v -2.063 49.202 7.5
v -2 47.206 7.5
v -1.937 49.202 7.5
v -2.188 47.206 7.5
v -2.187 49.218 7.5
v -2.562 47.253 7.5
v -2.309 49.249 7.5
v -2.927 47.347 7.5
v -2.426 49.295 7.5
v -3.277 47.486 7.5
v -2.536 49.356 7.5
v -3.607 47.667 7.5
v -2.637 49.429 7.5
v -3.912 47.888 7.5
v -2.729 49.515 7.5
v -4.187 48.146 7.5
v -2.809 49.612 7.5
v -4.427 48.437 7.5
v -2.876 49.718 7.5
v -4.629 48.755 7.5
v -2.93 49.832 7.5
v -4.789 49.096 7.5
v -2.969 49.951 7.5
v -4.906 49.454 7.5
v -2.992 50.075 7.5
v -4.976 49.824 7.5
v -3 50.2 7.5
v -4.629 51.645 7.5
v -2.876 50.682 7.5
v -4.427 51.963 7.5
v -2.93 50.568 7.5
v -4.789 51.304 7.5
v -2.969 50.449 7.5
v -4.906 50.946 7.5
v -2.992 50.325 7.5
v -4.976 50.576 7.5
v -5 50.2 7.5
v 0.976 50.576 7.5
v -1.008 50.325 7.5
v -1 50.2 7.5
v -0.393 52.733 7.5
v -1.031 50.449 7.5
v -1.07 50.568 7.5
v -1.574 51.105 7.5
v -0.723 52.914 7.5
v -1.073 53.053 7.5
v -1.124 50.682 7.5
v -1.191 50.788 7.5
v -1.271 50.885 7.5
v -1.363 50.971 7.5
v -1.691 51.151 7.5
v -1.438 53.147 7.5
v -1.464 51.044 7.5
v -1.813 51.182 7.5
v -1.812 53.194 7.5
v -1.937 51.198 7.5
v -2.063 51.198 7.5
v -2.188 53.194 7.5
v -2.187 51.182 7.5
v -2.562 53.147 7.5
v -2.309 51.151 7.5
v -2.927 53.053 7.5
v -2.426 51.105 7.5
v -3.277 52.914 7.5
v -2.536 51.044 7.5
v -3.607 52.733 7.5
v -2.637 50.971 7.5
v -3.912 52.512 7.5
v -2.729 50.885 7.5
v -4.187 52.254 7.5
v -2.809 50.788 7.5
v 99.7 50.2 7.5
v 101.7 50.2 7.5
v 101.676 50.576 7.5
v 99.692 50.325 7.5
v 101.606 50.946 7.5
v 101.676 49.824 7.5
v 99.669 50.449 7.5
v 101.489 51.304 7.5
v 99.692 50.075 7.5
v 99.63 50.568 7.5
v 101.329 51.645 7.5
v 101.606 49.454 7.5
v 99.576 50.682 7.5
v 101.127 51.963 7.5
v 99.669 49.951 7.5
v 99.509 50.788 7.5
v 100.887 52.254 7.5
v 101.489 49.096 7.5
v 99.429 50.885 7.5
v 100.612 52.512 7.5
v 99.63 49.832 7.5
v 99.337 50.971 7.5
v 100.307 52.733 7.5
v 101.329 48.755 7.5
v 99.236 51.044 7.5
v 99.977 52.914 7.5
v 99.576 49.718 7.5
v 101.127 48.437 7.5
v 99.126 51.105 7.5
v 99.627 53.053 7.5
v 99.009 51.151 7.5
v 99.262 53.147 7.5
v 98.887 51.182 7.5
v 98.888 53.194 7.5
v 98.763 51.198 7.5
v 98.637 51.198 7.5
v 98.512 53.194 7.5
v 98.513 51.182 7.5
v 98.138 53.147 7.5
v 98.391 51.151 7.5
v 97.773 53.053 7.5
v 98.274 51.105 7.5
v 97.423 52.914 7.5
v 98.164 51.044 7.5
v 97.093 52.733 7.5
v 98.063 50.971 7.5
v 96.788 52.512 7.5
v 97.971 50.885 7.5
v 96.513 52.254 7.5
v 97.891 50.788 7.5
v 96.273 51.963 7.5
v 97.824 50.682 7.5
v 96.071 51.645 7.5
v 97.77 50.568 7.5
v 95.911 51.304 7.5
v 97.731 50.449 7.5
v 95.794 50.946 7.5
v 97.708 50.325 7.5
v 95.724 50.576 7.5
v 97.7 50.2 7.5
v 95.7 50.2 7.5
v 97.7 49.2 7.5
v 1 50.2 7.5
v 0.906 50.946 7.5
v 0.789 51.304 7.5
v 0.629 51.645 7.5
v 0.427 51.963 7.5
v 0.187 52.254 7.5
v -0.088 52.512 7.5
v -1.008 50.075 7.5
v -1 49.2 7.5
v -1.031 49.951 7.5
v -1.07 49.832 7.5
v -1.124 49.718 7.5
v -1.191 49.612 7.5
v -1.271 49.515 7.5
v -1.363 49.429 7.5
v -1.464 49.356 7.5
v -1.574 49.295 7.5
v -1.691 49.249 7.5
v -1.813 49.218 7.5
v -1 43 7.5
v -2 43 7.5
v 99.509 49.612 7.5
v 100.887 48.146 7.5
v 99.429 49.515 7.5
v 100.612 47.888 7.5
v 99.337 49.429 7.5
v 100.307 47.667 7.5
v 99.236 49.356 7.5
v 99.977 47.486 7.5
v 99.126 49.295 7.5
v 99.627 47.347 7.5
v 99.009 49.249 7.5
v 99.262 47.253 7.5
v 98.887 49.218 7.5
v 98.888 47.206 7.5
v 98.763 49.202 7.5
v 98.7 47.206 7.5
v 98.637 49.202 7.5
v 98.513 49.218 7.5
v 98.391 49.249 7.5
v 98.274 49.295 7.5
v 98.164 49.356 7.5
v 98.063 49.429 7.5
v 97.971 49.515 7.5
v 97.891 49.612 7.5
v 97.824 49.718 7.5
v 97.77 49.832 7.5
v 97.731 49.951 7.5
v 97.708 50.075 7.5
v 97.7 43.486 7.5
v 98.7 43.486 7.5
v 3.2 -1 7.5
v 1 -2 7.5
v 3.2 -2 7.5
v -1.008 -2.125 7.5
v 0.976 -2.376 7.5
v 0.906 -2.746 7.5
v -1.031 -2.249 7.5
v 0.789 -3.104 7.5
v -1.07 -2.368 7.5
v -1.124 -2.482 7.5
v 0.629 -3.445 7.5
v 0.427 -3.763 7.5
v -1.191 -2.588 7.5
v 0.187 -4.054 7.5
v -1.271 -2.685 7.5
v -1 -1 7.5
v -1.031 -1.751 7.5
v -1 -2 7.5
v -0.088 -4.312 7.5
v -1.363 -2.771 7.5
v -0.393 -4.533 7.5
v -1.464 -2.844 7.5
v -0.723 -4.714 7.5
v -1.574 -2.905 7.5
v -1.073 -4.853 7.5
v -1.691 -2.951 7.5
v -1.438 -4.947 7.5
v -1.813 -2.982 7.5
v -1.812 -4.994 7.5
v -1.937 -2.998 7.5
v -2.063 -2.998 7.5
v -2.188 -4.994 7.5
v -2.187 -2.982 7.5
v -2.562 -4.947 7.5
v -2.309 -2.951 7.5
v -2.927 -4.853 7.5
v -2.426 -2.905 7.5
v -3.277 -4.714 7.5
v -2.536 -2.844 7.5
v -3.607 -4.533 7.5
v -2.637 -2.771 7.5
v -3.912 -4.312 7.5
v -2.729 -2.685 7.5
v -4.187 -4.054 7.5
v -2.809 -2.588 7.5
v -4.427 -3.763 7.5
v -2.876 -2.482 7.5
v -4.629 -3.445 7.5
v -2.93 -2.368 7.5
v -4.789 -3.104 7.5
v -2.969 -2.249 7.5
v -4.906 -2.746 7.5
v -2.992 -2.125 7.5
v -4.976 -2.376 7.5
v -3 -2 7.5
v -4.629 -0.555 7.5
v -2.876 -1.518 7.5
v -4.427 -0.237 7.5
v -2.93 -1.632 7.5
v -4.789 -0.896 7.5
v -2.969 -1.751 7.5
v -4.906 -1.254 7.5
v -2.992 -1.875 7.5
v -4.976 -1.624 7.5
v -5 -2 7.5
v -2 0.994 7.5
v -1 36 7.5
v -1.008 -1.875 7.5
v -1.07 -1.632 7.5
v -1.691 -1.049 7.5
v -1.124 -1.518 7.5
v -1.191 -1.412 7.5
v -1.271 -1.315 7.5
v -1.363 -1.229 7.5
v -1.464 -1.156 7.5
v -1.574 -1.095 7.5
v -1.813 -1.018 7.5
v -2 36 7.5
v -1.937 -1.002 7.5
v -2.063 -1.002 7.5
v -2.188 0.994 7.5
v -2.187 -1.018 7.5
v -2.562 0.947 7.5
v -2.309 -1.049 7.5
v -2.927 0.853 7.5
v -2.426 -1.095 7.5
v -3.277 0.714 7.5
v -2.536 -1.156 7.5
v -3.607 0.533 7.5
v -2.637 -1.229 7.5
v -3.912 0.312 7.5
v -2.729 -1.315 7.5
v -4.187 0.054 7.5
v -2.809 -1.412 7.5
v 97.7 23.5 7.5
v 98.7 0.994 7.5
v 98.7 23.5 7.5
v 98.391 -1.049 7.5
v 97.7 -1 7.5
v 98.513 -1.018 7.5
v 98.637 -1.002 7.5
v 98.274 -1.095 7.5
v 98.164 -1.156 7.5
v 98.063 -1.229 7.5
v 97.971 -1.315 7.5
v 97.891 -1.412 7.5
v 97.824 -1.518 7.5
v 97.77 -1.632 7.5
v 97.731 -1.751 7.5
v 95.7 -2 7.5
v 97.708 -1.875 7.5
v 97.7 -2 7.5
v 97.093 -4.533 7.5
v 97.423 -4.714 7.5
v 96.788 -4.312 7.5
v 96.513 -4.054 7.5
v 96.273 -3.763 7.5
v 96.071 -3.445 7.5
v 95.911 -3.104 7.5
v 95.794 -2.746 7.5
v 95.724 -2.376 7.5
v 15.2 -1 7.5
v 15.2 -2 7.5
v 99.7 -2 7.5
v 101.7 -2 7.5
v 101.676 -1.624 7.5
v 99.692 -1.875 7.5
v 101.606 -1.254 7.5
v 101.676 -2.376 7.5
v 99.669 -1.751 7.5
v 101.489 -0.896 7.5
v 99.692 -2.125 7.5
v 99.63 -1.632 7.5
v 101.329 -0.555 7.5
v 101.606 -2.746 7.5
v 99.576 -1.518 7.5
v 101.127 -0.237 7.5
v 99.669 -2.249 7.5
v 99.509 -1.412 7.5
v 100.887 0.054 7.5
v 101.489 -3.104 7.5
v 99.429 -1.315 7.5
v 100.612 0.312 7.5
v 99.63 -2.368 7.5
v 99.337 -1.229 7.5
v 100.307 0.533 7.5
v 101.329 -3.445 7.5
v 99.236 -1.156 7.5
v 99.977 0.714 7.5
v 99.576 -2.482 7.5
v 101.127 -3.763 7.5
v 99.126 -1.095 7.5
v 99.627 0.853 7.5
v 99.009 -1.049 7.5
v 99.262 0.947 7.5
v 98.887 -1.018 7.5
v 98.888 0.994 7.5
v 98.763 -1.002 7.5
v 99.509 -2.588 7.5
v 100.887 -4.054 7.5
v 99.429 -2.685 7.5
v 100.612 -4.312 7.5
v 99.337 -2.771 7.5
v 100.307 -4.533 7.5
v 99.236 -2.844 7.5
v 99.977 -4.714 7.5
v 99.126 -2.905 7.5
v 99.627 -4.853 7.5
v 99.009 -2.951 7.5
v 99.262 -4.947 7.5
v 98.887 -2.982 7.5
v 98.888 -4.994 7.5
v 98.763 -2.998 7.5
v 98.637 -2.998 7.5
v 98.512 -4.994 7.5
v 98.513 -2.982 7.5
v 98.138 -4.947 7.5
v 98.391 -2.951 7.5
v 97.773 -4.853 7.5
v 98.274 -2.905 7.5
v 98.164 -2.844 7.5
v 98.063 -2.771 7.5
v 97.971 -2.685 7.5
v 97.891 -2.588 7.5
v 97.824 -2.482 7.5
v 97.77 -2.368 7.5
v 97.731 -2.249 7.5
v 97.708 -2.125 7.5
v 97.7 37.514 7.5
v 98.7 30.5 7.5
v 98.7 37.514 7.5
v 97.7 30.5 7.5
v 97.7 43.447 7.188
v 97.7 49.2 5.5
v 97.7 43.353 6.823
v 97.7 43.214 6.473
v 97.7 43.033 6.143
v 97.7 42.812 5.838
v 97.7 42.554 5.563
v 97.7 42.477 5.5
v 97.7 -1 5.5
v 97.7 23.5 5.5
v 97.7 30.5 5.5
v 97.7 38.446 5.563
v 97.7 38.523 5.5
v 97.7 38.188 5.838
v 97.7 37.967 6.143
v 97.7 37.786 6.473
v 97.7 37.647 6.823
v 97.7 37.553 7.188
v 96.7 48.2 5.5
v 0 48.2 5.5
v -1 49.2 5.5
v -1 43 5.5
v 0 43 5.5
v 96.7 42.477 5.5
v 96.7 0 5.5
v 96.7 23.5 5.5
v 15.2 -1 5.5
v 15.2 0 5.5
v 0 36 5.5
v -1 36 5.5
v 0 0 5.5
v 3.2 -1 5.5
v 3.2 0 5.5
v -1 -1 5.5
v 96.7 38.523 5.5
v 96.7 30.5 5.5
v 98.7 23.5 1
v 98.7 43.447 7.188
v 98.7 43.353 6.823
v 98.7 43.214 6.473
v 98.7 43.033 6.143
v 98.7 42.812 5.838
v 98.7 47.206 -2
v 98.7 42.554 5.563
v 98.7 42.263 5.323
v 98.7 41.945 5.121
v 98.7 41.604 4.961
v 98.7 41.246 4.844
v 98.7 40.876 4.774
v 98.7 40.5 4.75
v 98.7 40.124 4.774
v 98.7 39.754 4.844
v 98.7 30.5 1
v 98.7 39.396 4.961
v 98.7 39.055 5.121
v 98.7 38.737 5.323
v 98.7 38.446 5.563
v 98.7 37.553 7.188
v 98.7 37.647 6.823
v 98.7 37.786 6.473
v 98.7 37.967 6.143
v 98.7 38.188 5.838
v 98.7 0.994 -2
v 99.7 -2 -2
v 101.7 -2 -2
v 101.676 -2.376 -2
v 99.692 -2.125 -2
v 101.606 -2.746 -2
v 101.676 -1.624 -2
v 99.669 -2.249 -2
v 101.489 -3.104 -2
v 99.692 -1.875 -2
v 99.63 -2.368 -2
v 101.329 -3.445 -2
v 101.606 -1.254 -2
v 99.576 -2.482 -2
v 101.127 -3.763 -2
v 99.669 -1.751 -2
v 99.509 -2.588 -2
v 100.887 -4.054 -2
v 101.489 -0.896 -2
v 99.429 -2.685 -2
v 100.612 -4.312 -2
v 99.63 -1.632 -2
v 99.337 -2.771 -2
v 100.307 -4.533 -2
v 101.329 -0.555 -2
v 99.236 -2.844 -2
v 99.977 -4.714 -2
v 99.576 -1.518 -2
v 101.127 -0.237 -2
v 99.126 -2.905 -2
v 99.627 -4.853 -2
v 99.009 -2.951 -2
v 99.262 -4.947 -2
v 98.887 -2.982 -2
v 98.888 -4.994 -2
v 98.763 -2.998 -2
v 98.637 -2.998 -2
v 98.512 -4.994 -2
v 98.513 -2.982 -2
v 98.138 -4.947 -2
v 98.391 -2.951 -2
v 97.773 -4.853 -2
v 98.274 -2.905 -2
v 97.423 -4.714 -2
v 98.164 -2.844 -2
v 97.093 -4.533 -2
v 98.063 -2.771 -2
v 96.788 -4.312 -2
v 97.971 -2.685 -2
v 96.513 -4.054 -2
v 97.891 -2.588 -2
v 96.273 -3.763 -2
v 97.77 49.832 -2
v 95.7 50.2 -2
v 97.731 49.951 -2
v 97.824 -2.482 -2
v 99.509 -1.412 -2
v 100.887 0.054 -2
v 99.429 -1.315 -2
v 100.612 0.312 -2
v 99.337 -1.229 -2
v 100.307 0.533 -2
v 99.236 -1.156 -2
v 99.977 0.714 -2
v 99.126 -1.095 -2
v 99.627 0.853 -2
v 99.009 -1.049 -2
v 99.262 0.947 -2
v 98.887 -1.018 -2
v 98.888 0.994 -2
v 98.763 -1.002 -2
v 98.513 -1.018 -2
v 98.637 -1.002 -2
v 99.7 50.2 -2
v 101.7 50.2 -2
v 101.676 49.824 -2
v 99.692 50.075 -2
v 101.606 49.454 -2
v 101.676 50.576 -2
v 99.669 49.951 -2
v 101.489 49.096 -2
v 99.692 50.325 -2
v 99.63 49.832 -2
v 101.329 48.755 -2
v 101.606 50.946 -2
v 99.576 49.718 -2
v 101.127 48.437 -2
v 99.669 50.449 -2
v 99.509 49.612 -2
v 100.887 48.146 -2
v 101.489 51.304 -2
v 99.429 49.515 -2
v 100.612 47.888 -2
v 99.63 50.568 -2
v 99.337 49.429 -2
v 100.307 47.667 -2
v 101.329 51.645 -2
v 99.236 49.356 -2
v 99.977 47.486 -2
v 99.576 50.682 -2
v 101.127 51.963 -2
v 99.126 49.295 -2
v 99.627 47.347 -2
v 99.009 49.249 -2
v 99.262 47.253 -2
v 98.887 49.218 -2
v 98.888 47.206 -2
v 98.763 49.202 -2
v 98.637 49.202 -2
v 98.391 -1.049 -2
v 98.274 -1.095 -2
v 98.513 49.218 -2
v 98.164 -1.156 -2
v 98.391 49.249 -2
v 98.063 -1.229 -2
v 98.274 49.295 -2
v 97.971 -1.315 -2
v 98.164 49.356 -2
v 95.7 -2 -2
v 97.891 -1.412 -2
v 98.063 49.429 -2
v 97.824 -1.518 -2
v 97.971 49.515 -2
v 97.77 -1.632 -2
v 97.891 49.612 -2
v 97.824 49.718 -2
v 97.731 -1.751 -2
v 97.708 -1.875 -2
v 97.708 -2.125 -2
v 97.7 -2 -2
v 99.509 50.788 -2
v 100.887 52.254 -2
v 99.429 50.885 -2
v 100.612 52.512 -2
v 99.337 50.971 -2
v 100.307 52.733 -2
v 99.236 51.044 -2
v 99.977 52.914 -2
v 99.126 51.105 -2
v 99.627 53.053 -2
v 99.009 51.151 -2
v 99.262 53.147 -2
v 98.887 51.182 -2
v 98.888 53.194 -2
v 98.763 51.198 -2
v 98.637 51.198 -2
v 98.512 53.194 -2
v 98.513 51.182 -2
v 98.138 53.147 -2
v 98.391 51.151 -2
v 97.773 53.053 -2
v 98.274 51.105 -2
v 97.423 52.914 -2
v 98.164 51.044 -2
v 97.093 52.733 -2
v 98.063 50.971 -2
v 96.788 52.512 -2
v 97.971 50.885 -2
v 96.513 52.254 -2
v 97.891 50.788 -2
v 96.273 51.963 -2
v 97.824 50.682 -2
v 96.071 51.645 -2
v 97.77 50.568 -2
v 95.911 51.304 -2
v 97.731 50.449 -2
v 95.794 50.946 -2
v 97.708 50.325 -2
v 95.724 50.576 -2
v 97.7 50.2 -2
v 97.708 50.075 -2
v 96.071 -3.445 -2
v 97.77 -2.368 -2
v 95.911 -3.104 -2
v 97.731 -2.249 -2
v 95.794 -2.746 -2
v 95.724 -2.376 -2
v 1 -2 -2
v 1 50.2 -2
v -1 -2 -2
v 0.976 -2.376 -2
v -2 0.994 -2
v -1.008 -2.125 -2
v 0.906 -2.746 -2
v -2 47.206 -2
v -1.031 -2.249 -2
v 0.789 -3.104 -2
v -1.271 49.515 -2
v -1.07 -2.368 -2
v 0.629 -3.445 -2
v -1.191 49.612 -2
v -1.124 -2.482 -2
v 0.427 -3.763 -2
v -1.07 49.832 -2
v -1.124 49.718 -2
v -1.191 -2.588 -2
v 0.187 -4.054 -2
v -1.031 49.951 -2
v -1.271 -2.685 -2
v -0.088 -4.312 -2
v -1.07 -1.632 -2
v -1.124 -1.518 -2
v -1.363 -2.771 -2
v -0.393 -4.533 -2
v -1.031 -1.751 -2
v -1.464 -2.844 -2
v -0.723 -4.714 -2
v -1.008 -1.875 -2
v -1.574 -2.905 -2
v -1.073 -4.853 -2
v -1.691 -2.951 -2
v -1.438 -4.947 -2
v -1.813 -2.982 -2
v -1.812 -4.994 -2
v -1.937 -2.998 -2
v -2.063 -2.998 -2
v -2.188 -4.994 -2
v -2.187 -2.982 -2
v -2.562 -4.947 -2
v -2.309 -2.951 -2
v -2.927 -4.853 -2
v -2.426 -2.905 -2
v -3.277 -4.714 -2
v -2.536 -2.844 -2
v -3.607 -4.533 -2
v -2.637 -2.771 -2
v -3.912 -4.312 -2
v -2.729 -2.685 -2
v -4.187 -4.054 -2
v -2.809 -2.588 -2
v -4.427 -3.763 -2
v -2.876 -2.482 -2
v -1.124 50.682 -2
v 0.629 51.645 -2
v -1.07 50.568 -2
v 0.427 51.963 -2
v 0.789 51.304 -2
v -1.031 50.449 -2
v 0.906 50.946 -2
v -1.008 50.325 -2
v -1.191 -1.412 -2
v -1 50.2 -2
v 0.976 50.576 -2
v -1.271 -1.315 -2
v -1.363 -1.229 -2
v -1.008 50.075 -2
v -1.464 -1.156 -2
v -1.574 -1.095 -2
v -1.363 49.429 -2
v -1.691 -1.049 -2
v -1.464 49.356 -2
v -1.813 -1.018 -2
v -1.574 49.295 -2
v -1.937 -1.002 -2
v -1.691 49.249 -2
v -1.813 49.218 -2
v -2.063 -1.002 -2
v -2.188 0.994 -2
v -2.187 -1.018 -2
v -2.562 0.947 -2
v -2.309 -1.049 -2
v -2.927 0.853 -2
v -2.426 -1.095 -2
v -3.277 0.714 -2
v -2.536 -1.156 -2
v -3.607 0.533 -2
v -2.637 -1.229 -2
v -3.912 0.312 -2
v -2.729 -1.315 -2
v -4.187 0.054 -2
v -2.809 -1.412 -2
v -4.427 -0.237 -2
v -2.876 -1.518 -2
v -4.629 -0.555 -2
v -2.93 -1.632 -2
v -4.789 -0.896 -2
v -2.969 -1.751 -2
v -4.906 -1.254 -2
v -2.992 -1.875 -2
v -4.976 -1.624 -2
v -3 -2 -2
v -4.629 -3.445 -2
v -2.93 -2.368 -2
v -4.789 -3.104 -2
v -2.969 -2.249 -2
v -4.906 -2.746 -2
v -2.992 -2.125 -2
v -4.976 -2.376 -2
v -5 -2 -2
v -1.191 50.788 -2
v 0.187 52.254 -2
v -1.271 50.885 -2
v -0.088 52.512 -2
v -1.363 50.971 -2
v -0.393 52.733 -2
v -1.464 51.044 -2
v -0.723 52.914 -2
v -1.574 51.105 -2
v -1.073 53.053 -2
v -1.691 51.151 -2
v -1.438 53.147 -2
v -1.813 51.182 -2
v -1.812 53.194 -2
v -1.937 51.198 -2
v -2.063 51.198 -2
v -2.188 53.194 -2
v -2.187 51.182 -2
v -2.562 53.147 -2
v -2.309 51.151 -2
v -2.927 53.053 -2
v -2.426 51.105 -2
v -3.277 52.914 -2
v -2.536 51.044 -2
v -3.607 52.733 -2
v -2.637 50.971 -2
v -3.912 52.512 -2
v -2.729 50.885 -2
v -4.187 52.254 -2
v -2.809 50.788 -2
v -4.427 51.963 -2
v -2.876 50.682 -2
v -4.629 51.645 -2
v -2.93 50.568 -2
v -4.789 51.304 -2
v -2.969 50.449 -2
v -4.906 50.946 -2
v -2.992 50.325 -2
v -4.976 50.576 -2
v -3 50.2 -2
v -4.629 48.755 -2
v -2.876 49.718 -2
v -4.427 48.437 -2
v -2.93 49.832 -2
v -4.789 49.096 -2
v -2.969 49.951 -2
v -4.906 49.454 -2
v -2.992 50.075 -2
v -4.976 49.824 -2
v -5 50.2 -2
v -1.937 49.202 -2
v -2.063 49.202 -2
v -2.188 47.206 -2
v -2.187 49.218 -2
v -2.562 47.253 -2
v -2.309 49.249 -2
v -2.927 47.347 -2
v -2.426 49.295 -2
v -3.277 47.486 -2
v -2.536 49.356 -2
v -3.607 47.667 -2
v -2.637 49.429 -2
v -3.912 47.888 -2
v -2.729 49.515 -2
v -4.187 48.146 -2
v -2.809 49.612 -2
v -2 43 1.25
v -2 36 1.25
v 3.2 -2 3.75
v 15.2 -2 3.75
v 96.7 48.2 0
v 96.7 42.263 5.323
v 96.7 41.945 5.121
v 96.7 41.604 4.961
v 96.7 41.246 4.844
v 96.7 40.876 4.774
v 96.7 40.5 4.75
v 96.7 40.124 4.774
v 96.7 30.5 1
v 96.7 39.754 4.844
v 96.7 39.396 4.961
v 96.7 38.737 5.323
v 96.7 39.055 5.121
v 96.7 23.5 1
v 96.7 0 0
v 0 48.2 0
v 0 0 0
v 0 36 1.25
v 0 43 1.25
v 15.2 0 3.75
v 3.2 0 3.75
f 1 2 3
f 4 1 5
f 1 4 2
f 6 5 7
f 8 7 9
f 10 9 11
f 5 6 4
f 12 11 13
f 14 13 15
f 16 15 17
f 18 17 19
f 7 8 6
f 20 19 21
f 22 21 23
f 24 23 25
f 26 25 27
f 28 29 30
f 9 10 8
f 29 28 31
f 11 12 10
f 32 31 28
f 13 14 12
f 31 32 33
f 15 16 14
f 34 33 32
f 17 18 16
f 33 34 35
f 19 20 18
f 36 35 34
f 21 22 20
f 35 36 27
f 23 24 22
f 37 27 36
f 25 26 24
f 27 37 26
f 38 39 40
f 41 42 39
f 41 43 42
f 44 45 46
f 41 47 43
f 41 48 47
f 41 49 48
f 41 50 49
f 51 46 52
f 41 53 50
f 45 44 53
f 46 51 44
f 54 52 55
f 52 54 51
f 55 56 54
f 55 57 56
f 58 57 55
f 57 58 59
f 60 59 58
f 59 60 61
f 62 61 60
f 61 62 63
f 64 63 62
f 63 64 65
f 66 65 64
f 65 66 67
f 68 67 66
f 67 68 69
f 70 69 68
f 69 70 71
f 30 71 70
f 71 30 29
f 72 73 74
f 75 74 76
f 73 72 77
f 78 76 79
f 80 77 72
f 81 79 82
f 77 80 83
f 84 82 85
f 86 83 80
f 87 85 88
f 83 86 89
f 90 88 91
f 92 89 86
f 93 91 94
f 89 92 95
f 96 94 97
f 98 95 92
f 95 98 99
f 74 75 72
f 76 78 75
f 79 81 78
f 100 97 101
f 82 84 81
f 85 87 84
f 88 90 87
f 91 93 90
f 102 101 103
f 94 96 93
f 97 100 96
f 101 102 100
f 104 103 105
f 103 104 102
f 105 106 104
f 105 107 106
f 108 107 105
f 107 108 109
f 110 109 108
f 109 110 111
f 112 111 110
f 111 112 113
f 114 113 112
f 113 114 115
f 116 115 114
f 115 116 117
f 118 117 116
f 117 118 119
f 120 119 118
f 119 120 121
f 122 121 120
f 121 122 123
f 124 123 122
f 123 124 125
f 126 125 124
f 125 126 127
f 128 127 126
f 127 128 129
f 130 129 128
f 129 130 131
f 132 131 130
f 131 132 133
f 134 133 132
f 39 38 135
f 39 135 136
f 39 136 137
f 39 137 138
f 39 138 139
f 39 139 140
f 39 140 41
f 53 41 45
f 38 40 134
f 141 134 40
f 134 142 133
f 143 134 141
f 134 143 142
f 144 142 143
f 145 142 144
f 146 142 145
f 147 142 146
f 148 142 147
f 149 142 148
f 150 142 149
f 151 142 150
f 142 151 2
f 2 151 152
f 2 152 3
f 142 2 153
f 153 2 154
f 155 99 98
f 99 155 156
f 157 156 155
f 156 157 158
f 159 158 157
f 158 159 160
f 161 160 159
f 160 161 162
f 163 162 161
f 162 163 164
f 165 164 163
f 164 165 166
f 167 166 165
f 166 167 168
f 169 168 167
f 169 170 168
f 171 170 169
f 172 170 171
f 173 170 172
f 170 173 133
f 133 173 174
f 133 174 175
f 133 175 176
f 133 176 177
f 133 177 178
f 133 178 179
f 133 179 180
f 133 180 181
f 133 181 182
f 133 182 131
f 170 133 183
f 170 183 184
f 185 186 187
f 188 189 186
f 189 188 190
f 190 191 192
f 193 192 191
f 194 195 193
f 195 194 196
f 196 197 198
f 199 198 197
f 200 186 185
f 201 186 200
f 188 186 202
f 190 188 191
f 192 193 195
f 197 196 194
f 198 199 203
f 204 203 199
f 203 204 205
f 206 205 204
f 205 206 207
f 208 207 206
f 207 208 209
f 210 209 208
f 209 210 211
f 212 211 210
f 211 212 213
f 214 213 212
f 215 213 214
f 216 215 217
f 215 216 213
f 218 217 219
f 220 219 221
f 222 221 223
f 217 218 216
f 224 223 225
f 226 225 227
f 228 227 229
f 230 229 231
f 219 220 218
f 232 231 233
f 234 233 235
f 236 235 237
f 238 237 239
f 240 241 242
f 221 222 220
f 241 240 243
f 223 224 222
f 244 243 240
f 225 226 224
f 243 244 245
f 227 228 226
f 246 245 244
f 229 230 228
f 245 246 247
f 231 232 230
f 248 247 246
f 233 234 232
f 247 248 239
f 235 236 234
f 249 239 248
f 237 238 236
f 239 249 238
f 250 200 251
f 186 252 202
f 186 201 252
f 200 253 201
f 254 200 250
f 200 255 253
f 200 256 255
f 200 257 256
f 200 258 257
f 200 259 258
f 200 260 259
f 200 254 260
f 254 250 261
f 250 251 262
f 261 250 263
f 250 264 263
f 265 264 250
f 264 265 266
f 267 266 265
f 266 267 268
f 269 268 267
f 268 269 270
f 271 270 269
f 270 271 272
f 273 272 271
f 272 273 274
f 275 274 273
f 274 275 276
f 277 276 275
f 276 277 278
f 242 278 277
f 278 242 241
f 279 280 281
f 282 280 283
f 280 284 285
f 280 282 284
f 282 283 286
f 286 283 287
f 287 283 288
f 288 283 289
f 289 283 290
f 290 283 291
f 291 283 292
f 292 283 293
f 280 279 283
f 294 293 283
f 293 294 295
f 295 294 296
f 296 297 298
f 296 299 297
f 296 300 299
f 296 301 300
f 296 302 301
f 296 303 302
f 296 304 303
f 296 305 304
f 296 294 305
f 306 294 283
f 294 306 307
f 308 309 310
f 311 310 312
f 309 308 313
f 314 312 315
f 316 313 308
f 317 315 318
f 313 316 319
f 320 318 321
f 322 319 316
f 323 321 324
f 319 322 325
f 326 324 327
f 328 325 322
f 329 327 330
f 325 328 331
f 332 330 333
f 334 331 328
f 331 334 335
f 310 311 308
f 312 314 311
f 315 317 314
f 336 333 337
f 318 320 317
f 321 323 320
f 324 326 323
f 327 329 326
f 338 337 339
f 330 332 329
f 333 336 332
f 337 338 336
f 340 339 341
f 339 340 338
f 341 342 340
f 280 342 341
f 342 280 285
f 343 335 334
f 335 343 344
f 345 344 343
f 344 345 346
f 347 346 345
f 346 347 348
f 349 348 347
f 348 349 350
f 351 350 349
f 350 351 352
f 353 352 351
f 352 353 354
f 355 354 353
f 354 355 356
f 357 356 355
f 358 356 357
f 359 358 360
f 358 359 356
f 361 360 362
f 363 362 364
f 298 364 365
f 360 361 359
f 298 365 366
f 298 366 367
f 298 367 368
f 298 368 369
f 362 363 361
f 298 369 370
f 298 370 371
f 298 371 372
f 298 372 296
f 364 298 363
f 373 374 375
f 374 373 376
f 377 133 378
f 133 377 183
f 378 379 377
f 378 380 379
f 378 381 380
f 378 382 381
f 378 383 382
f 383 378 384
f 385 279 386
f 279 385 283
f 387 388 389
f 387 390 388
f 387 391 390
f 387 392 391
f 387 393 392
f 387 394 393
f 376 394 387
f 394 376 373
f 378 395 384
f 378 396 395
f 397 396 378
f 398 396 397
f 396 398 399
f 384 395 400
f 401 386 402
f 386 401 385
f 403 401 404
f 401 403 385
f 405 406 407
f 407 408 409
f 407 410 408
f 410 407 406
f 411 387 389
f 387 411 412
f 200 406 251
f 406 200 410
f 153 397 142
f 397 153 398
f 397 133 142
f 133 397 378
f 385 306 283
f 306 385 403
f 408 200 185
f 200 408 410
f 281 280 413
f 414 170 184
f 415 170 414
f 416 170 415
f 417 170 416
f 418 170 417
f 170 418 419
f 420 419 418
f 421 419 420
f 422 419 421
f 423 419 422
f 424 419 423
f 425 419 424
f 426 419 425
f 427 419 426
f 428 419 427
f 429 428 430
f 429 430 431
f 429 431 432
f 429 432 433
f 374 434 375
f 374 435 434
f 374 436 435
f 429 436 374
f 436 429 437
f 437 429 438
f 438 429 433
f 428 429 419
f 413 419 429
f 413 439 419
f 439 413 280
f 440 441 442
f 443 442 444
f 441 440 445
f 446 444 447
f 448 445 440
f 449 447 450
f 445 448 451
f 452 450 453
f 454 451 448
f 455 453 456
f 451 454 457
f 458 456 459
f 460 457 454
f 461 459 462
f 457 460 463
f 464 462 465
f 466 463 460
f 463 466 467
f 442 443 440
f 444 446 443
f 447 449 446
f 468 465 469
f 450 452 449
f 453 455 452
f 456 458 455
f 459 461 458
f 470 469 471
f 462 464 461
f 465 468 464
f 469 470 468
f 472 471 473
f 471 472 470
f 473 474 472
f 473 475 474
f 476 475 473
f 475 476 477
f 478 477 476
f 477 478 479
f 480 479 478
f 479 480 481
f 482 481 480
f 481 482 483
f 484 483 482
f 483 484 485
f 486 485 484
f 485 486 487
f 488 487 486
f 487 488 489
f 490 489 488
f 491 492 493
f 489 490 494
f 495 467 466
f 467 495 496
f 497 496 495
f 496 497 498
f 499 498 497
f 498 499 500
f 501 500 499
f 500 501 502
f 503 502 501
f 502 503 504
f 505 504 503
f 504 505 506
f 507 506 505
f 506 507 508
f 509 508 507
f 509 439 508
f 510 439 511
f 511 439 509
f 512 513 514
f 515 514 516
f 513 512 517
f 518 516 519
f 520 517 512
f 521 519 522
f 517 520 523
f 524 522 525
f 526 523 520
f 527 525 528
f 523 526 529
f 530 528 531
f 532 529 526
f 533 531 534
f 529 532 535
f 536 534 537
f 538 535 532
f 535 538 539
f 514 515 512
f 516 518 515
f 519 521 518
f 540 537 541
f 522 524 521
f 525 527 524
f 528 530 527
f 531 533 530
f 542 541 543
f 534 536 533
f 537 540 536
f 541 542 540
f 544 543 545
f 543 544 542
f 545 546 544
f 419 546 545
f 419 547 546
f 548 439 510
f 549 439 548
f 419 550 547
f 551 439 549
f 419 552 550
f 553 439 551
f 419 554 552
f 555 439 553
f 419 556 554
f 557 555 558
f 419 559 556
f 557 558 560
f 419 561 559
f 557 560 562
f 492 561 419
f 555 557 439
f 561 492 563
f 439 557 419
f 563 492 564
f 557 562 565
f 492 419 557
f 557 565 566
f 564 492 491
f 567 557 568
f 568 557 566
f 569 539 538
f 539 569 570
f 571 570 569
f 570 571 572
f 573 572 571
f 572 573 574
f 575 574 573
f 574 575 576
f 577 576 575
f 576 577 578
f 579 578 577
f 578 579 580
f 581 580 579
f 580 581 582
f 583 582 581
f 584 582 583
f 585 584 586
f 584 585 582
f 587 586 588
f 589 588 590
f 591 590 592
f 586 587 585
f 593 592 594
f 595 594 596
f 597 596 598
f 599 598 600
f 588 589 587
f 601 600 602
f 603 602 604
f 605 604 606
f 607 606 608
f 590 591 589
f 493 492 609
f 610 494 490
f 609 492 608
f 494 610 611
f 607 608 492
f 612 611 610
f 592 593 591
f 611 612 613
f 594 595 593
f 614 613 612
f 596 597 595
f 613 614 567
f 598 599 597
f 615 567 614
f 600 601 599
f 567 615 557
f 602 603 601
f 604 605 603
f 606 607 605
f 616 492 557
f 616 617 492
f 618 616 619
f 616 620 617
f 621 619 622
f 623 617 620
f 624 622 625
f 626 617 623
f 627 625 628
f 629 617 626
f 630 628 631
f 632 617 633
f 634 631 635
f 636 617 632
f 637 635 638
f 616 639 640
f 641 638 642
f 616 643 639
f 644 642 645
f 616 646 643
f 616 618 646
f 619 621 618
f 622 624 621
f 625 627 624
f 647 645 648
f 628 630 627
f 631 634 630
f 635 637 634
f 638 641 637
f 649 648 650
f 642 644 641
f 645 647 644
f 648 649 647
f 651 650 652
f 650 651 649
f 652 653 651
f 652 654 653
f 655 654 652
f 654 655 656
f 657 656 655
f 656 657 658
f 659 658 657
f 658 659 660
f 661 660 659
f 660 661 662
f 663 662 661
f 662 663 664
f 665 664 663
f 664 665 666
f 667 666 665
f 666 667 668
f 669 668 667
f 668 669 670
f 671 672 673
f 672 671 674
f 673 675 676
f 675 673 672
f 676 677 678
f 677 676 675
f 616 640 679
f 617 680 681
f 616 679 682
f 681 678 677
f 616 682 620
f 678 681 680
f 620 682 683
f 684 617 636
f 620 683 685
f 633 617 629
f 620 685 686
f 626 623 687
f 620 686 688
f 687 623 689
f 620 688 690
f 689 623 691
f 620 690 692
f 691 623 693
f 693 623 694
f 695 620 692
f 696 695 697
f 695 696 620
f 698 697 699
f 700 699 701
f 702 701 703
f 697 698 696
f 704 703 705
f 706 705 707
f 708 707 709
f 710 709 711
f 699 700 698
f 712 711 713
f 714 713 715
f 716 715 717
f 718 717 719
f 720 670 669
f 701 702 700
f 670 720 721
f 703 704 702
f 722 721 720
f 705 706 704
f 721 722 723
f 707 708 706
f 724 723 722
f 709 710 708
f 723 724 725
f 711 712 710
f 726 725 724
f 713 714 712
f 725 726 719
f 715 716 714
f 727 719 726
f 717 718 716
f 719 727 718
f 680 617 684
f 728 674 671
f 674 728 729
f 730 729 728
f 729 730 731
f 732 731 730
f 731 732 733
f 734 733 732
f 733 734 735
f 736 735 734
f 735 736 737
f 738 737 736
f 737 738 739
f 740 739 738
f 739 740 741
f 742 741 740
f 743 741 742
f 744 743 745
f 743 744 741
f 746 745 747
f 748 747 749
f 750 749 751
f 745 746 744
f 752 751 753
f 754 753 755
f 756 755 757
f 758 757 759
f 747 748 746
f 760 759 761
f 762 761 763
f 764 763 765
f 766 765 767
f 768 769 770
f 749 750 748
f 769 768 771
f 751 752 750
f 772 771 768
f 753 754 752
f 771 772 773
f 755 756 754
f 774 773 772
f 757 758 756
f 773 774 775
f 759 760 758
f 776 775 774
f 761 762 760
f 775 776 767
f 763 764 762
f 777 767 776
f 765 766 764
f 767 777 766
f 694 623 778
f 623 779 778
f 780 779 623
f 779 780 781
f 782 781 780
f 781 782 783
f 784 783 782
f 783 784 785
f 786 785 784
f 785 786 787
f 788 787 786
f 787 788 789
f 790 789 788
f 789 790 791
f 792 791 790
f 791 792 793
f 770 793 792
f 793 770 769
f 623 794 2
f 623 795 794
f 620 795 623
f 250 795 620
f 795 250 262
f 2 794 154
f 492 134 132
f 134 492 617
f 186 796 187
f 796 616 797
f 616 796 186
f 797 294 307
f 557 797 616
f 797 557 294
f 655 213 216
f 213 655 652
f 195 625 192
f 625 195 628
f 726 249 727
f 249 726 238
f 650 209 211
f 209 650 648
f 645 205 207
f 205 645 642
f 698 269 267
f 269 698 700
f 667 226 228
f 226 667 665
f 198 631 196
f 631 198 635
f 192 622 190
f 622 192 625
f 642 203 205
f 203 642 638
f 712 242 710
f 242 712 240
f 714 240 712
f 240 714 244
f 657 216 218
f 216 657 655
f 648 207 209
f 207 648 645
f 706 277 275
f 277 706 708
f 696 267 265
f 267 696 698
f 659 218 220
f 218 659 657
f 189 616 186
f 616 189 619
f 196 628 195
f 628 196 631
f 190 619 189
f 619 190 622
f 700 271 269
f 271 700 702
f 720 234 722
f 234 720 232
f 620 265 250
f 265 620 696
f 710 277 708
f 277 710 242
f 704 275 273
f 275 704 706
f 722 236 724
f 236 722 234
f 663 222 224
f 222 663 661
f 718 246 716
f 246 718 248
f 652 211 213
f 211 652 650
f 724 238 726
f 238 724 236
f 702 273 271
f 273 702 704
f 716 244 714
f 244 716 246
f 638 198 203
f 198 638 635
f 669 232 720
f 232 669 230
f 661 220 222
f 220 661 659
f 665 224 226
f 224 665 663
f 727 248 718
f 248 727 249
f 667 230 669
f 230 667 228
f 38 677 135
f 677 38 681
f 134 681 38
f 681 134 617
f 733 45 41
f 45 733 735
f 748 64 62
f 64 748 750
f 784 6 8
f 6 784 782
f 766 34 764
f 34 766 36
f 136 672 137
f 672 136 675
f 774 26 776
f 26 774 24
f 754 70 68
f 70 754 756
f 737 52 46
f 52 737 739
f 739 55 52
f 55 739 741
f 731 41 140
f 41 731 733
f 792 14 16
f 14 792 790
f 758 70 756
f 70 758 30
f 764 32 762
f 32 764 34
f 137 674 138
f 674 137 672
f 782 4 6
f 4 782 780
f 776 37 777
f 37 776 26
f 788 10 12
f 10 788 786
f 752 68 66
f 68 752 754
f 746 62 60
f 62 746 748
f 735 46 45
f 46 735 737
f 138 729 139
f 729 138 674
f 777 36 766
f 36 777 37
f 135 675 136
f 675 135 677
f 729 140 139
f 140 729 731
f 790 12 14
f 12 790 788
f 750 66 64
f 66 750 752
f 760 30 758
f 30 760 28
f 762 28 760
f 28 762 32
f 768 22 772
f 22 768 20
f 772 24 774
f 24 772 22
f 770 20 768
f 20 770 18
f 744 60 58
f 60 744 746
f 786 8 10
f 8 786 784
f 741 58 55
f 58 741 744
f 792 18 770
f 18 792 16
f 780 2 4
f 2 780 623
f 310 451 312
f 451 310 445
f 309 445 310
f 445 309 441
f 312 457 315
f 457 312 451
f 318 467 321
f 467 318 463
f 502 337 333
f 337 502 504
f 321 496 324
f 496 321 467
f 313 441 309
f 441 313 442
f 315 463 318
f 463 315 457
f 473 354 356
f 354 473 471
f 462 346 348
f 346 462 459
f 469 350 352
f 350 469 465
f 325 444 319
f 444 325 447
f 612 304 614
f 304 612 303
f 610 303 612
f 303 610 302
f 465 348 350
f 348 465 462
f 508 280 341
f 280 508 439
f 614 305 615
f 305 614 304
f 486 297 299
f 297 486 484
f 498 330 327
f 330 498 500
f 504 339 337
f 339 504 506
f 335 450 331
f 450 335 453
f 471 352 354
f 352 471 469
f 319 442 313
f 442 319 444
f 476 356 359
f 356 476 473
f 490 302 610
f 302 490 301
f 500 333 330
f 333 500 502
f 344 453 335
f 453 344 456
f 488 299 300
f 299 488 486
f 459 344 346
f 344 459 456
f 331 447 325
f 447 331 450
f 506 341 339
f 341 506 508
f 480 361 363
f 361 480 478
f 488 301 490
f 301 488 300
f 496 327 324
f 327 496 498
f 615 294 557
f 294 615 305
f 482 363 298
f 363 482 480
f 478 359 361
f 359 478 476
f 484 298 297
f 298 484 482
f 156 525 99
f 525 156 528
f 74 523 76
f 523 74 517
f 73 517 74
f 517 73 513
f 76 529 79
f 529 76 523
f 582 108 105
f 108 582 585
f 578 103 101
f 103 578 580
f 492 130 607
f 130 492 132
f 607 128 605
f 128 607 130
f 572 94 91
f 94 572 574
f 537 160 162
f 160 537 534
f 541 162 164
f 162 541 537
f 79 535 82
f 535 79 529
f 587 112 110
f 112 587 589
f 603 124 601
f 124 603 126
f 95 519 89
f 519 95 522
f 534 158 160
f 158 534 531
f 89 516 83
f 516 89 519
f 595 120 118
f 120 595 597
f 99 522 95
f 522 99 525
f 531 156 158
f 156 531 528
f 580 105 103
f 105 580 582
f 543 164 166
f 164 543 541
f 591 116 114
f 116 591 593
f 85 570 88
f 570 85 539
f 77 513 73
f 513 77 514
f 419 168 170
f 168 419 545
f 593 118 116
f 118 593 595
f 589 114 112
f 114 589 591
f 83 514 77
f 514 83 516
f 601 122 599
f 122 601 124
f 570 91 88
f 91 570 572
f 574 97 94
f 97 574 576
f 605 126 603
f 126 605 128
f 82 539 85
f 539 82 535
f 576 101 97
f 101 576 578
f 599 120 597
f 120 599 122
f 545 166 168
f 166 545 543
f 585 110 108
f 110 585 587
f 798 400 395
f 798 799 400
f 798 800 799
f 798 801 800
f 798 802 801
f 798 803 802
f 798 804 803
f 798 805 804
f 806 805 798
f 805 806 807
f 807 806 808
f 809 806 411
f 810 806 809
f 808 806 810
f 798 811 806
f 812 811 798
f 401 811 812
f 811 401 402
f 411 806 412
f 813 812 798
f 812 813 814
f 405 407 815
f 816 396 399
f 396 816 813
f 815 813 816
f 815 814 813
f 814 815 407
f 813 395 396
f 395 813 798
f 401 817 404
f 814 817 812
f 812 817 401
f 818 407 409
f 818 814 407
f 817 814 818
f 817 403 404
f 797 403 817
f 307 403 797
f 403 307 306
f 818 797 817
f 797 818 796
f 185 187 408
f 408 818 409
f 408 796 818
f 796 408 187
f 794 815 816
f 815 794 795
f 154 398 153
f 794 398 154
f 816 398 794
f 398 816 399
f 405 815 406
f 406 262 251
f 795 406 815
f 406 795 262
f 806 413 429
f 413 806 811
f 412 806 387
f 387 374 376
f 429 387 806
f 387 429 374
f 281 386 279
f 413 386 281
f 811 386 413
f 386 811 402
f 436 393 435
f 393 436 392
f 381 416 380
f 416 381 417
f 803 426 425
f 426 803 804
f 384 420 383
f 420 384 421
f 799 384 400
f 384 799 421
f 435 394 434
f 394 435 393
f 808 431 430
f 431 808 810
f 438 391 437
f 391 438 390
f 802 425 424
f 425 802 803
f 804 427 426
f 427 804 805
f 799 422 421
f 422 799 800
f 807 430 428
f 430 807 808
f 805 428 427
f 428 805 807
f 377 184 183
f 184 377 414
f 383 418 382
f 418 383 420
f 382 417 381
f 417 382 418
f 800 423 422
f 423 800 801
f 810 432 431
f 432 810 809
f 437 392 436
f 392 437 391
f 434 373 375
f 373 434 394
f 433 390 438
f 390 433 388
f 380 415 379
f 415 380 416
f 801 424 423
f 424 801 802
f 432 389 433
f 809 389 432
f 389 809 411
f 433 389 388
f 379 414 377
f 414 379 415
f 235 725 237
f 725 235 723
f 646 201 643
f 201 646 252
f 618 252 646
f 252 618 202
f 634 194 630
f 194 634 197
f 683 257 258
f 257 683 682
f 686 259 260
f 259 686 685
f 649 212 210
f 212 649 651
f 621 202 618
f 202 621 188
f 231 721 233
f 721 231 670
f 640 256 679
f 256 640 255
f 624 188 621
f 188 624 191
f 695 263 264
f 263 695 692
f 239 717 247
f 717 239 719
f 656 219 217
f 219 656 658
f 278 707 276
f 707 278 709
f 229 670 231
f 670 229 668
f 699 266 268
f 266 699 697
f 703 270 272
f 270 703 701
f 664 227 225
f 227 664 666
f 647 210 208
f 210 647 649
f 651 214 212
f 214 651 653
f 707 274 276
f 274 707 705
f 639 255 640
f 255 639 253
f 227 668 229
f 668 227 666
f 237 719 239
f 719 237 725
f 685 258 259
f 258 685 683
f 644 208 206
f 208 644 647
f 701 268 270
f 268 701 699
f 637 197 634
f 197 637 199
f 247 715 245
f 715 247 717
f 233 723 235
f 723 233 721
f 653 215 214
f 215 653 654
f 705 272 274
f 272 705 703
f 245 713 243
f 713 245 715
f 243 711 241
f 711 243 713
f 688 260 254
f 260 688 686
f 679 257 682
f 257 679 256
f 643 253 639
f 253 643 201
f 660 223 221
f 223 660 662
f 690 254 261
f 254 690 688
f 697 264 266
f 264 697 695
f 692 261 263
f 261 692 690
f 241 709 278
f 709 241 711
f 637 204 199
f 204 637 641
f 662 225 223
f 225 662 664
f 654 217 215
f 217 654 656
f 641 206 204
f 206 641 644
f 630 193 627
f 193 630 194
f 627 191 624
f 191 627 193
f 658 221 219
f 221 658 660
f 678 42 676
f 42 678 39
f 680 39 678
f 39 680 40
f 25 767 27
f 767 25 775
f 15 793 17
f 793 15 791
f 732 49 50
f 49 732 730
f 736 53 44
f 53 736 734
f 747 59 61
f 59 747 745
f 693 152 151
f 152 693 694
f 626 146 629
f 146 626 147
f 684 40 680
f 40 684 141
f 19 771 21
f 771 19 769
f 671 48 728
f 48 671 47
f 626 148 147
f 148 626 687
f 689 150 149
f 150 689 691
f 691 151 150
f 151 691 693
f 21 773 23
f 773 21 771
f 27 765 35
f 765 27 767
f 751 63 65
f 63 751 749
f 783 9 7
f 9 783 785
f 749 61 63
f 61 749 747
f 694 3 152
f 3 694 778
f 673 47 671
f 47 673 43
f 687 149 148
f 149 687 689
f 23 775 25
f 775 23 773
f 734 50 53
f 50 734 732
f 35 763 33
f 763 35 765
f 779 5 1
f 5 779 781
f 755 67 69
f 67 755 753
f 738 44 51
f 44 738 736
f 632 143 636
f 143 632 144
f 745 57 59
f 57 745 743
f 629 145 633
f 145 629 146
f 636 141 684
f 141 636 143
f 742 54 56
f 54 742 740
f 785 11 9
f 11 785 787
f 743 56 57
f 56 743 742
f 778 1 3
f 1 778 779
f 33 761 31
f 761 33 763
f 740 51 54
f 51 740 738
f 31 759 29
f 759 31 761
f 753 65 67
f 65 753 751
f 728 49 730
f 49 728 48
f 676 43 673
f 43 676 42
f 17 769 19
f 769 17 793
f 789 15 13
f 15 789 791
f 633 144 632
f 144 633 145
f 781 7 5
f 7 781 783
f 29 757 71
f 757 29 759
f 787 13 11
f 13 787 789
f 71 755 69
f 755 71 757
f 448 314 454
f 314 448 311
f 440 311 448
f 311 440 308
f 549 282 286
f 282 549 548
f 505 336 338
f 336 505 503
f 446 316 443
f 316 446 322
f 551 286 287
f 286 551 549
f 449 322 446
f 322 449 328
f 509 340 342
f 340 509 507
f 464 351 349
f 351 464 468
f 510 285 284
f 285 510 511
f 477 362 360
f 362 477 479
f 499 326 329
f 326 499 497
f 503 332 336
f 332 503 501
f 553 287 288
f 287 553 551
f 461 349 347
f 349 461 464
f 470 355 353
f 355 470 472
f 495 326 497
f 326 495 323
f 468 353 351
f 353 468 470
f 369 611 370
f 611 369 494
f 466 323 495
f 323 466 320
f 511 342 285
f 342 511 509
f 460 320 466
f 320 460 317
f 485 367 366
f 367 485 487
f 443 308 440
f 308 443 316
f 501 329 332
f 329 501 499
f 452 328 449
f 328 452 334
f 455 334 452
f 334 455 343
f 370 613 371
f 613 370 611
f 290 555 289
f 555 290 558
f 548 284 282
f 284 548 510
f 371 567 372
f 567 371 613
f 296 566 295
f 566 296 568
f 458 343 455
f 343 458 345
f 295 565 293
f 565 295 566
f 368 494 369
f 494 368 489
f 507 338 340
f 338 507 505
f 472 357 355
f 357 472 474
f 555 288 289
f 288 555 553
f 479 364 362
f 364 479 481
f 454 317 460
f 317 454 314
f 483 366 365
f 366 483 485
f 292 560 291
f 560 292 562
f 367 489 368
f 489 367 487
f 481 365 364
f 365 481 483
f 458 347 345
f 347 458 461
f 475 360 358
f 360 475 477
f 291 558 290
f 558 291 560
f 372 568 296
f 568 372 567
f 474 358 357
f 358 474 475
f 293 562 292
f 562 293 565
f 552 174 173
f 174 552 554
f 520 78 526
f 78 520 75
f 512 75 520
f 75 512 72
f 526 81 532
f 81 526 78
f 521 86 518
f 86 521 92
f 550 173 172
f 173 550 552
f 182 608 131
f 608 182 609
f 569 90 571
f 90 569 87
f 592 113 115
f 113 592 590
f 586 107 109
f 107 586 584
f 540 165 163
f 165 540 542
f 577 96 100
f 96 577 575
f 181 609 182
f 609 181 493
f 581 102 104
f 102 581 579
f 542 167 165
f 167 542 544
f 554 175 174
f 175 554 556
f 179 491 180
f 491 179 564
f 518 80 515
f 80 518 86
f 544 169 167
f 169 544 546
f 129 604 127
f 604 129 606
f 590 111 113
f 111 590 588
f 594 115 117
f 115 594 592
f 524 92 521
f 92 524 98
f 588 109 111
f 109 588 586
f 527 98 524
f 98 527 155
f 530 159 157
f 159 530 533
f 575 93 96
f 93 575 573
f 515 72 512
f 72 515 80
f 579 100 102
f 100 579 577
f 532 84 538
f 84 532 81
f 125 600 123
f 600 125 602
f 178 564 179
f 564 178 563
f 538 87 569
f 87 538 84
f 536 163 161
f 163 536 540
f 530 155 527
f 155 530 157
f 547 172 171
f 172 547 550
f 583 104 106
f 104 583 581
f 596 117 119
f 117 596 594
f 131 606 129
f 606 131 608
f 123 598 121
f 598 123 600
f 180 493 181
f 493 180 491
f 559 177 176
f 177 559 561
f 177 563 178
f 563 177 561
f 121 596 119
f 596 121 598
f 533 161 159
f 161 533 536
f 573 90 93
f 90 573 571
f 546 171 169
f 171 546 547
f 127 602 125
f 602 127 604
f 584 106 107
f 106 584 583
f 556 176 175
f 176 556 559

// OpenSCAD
$fn=50;

brd_l = 96.7;
brd_w = 48.2;
brd_h = 15;
brd_bottom = 2;

usb_l = 12;
usb_w = 12;
usb_h = 11;

sma_l = 12;
sma_w = 7;
sma_h = 7;

sw_rad = 6/2;
sw_h = 12;

wall = 2;

mnt_rad = 3.8/2;
screw_rad = 6/2;
screw_h = brd_h + (wall*2);
screw_hole_rad = 1;

build = 0;

intersection(){
	if (build == 1) {
		union(){
		//top section
			translate([-(wall*4),-(wall*4),(brd_h/2)])	
			cube([brd_l+ (wall*8),brd_w+ (wall*8),(brd_h/2)+ (wall*2)]);
			
			translate([-1,-1,brd_h/2-2])
			cube([brd_l+2,brd_w+2,(brd_h/2)+2]);
		}
	} else {
		//Bottom section
		difference(){
			translate([-(wall*4),-(wall*4),-(wall*2)])
			cube([brd_l+ (wall*8),brd_w+ (wall*8),(brd_h/2)+ (wall*2)]);

			translate([-1,-1,brd_h/2-2])
			cube([brd_l+2,brd_w+2,(brd_h/2)+2]);
		}
	}
	
	difference(){
		union(){
			translate([-wall,-wall,-wall])
			cube([brd_l + (wall*2),brd_w + (wall*2),brd_h + (wall*2)]);	

			translate([-wall,-wall,-wall])
			cylinder(r=screw_rad, h= screw_h);

			translate([-wall,brd_w+wall,-wall])
			cylinder(r=screw_rad, h= screw_h);
			
			translate([brd_l+ wall,-wall,-wall])
			cylinder(r=screw_rad, h= screw_h);
			
			translate([brd_l+wall,brd_w+wall,-wall])
			cylinder(r=screw_rad, h= screw_h);				
						
		}

		color("red")
		union(){
			cube([brd_l,brd_w,brd_h]);
			
			// USB
			translate([3.2,-11,brd_h-usb_h-.25])
			cube([usb_l,usb_w,usb_h]);
			
			// SMA IN
			translate([-11,36,1.25])
			cube([sma_l,sma_w,sma_h]);

			//SMA OUT
			translate([brd_l-1,23.5,1])
			cube([sma_l,sma_w,sma_h]);			

			// SWITCH
			translate([brd_l-1,37.5+sw_rad,4.75+sw_rad])
			rotate([0,90,0])
			cylinder(r=sw_rad,h=sw_h);
		}
		
		translate([4,brd_w/2+8,brd_h+wall-.5])
		union(){
			cube([.5,12,1]);
			
			translate([0,8,0])
			rotate([0,0,30])
			cube([.5,4,1]);
			
			translate([0,8,0])
			rotate([0,0,-30])
			cube([.5,4,1]);
		}
		
		translate([-wall,-wall,-wall-1])
		cylinder(r=screw_hole_rad ,h=screw_h+2);

		translate([-wall,brd_w+wall,-wall-1])
		cylinder(r=screw_hole_rad ,h=screw_h+2);
		
		translate([brd_l+wall,-wall,-wall-1])
		cylinder(r=screw_hole_rad ,h=screw_h+2);
		
		translate([brd_l+wall,brd_w+wall,-wall-1])
		cylinder(r=screw_hole_rad ,h=screw_h+2);
		
	}
}
